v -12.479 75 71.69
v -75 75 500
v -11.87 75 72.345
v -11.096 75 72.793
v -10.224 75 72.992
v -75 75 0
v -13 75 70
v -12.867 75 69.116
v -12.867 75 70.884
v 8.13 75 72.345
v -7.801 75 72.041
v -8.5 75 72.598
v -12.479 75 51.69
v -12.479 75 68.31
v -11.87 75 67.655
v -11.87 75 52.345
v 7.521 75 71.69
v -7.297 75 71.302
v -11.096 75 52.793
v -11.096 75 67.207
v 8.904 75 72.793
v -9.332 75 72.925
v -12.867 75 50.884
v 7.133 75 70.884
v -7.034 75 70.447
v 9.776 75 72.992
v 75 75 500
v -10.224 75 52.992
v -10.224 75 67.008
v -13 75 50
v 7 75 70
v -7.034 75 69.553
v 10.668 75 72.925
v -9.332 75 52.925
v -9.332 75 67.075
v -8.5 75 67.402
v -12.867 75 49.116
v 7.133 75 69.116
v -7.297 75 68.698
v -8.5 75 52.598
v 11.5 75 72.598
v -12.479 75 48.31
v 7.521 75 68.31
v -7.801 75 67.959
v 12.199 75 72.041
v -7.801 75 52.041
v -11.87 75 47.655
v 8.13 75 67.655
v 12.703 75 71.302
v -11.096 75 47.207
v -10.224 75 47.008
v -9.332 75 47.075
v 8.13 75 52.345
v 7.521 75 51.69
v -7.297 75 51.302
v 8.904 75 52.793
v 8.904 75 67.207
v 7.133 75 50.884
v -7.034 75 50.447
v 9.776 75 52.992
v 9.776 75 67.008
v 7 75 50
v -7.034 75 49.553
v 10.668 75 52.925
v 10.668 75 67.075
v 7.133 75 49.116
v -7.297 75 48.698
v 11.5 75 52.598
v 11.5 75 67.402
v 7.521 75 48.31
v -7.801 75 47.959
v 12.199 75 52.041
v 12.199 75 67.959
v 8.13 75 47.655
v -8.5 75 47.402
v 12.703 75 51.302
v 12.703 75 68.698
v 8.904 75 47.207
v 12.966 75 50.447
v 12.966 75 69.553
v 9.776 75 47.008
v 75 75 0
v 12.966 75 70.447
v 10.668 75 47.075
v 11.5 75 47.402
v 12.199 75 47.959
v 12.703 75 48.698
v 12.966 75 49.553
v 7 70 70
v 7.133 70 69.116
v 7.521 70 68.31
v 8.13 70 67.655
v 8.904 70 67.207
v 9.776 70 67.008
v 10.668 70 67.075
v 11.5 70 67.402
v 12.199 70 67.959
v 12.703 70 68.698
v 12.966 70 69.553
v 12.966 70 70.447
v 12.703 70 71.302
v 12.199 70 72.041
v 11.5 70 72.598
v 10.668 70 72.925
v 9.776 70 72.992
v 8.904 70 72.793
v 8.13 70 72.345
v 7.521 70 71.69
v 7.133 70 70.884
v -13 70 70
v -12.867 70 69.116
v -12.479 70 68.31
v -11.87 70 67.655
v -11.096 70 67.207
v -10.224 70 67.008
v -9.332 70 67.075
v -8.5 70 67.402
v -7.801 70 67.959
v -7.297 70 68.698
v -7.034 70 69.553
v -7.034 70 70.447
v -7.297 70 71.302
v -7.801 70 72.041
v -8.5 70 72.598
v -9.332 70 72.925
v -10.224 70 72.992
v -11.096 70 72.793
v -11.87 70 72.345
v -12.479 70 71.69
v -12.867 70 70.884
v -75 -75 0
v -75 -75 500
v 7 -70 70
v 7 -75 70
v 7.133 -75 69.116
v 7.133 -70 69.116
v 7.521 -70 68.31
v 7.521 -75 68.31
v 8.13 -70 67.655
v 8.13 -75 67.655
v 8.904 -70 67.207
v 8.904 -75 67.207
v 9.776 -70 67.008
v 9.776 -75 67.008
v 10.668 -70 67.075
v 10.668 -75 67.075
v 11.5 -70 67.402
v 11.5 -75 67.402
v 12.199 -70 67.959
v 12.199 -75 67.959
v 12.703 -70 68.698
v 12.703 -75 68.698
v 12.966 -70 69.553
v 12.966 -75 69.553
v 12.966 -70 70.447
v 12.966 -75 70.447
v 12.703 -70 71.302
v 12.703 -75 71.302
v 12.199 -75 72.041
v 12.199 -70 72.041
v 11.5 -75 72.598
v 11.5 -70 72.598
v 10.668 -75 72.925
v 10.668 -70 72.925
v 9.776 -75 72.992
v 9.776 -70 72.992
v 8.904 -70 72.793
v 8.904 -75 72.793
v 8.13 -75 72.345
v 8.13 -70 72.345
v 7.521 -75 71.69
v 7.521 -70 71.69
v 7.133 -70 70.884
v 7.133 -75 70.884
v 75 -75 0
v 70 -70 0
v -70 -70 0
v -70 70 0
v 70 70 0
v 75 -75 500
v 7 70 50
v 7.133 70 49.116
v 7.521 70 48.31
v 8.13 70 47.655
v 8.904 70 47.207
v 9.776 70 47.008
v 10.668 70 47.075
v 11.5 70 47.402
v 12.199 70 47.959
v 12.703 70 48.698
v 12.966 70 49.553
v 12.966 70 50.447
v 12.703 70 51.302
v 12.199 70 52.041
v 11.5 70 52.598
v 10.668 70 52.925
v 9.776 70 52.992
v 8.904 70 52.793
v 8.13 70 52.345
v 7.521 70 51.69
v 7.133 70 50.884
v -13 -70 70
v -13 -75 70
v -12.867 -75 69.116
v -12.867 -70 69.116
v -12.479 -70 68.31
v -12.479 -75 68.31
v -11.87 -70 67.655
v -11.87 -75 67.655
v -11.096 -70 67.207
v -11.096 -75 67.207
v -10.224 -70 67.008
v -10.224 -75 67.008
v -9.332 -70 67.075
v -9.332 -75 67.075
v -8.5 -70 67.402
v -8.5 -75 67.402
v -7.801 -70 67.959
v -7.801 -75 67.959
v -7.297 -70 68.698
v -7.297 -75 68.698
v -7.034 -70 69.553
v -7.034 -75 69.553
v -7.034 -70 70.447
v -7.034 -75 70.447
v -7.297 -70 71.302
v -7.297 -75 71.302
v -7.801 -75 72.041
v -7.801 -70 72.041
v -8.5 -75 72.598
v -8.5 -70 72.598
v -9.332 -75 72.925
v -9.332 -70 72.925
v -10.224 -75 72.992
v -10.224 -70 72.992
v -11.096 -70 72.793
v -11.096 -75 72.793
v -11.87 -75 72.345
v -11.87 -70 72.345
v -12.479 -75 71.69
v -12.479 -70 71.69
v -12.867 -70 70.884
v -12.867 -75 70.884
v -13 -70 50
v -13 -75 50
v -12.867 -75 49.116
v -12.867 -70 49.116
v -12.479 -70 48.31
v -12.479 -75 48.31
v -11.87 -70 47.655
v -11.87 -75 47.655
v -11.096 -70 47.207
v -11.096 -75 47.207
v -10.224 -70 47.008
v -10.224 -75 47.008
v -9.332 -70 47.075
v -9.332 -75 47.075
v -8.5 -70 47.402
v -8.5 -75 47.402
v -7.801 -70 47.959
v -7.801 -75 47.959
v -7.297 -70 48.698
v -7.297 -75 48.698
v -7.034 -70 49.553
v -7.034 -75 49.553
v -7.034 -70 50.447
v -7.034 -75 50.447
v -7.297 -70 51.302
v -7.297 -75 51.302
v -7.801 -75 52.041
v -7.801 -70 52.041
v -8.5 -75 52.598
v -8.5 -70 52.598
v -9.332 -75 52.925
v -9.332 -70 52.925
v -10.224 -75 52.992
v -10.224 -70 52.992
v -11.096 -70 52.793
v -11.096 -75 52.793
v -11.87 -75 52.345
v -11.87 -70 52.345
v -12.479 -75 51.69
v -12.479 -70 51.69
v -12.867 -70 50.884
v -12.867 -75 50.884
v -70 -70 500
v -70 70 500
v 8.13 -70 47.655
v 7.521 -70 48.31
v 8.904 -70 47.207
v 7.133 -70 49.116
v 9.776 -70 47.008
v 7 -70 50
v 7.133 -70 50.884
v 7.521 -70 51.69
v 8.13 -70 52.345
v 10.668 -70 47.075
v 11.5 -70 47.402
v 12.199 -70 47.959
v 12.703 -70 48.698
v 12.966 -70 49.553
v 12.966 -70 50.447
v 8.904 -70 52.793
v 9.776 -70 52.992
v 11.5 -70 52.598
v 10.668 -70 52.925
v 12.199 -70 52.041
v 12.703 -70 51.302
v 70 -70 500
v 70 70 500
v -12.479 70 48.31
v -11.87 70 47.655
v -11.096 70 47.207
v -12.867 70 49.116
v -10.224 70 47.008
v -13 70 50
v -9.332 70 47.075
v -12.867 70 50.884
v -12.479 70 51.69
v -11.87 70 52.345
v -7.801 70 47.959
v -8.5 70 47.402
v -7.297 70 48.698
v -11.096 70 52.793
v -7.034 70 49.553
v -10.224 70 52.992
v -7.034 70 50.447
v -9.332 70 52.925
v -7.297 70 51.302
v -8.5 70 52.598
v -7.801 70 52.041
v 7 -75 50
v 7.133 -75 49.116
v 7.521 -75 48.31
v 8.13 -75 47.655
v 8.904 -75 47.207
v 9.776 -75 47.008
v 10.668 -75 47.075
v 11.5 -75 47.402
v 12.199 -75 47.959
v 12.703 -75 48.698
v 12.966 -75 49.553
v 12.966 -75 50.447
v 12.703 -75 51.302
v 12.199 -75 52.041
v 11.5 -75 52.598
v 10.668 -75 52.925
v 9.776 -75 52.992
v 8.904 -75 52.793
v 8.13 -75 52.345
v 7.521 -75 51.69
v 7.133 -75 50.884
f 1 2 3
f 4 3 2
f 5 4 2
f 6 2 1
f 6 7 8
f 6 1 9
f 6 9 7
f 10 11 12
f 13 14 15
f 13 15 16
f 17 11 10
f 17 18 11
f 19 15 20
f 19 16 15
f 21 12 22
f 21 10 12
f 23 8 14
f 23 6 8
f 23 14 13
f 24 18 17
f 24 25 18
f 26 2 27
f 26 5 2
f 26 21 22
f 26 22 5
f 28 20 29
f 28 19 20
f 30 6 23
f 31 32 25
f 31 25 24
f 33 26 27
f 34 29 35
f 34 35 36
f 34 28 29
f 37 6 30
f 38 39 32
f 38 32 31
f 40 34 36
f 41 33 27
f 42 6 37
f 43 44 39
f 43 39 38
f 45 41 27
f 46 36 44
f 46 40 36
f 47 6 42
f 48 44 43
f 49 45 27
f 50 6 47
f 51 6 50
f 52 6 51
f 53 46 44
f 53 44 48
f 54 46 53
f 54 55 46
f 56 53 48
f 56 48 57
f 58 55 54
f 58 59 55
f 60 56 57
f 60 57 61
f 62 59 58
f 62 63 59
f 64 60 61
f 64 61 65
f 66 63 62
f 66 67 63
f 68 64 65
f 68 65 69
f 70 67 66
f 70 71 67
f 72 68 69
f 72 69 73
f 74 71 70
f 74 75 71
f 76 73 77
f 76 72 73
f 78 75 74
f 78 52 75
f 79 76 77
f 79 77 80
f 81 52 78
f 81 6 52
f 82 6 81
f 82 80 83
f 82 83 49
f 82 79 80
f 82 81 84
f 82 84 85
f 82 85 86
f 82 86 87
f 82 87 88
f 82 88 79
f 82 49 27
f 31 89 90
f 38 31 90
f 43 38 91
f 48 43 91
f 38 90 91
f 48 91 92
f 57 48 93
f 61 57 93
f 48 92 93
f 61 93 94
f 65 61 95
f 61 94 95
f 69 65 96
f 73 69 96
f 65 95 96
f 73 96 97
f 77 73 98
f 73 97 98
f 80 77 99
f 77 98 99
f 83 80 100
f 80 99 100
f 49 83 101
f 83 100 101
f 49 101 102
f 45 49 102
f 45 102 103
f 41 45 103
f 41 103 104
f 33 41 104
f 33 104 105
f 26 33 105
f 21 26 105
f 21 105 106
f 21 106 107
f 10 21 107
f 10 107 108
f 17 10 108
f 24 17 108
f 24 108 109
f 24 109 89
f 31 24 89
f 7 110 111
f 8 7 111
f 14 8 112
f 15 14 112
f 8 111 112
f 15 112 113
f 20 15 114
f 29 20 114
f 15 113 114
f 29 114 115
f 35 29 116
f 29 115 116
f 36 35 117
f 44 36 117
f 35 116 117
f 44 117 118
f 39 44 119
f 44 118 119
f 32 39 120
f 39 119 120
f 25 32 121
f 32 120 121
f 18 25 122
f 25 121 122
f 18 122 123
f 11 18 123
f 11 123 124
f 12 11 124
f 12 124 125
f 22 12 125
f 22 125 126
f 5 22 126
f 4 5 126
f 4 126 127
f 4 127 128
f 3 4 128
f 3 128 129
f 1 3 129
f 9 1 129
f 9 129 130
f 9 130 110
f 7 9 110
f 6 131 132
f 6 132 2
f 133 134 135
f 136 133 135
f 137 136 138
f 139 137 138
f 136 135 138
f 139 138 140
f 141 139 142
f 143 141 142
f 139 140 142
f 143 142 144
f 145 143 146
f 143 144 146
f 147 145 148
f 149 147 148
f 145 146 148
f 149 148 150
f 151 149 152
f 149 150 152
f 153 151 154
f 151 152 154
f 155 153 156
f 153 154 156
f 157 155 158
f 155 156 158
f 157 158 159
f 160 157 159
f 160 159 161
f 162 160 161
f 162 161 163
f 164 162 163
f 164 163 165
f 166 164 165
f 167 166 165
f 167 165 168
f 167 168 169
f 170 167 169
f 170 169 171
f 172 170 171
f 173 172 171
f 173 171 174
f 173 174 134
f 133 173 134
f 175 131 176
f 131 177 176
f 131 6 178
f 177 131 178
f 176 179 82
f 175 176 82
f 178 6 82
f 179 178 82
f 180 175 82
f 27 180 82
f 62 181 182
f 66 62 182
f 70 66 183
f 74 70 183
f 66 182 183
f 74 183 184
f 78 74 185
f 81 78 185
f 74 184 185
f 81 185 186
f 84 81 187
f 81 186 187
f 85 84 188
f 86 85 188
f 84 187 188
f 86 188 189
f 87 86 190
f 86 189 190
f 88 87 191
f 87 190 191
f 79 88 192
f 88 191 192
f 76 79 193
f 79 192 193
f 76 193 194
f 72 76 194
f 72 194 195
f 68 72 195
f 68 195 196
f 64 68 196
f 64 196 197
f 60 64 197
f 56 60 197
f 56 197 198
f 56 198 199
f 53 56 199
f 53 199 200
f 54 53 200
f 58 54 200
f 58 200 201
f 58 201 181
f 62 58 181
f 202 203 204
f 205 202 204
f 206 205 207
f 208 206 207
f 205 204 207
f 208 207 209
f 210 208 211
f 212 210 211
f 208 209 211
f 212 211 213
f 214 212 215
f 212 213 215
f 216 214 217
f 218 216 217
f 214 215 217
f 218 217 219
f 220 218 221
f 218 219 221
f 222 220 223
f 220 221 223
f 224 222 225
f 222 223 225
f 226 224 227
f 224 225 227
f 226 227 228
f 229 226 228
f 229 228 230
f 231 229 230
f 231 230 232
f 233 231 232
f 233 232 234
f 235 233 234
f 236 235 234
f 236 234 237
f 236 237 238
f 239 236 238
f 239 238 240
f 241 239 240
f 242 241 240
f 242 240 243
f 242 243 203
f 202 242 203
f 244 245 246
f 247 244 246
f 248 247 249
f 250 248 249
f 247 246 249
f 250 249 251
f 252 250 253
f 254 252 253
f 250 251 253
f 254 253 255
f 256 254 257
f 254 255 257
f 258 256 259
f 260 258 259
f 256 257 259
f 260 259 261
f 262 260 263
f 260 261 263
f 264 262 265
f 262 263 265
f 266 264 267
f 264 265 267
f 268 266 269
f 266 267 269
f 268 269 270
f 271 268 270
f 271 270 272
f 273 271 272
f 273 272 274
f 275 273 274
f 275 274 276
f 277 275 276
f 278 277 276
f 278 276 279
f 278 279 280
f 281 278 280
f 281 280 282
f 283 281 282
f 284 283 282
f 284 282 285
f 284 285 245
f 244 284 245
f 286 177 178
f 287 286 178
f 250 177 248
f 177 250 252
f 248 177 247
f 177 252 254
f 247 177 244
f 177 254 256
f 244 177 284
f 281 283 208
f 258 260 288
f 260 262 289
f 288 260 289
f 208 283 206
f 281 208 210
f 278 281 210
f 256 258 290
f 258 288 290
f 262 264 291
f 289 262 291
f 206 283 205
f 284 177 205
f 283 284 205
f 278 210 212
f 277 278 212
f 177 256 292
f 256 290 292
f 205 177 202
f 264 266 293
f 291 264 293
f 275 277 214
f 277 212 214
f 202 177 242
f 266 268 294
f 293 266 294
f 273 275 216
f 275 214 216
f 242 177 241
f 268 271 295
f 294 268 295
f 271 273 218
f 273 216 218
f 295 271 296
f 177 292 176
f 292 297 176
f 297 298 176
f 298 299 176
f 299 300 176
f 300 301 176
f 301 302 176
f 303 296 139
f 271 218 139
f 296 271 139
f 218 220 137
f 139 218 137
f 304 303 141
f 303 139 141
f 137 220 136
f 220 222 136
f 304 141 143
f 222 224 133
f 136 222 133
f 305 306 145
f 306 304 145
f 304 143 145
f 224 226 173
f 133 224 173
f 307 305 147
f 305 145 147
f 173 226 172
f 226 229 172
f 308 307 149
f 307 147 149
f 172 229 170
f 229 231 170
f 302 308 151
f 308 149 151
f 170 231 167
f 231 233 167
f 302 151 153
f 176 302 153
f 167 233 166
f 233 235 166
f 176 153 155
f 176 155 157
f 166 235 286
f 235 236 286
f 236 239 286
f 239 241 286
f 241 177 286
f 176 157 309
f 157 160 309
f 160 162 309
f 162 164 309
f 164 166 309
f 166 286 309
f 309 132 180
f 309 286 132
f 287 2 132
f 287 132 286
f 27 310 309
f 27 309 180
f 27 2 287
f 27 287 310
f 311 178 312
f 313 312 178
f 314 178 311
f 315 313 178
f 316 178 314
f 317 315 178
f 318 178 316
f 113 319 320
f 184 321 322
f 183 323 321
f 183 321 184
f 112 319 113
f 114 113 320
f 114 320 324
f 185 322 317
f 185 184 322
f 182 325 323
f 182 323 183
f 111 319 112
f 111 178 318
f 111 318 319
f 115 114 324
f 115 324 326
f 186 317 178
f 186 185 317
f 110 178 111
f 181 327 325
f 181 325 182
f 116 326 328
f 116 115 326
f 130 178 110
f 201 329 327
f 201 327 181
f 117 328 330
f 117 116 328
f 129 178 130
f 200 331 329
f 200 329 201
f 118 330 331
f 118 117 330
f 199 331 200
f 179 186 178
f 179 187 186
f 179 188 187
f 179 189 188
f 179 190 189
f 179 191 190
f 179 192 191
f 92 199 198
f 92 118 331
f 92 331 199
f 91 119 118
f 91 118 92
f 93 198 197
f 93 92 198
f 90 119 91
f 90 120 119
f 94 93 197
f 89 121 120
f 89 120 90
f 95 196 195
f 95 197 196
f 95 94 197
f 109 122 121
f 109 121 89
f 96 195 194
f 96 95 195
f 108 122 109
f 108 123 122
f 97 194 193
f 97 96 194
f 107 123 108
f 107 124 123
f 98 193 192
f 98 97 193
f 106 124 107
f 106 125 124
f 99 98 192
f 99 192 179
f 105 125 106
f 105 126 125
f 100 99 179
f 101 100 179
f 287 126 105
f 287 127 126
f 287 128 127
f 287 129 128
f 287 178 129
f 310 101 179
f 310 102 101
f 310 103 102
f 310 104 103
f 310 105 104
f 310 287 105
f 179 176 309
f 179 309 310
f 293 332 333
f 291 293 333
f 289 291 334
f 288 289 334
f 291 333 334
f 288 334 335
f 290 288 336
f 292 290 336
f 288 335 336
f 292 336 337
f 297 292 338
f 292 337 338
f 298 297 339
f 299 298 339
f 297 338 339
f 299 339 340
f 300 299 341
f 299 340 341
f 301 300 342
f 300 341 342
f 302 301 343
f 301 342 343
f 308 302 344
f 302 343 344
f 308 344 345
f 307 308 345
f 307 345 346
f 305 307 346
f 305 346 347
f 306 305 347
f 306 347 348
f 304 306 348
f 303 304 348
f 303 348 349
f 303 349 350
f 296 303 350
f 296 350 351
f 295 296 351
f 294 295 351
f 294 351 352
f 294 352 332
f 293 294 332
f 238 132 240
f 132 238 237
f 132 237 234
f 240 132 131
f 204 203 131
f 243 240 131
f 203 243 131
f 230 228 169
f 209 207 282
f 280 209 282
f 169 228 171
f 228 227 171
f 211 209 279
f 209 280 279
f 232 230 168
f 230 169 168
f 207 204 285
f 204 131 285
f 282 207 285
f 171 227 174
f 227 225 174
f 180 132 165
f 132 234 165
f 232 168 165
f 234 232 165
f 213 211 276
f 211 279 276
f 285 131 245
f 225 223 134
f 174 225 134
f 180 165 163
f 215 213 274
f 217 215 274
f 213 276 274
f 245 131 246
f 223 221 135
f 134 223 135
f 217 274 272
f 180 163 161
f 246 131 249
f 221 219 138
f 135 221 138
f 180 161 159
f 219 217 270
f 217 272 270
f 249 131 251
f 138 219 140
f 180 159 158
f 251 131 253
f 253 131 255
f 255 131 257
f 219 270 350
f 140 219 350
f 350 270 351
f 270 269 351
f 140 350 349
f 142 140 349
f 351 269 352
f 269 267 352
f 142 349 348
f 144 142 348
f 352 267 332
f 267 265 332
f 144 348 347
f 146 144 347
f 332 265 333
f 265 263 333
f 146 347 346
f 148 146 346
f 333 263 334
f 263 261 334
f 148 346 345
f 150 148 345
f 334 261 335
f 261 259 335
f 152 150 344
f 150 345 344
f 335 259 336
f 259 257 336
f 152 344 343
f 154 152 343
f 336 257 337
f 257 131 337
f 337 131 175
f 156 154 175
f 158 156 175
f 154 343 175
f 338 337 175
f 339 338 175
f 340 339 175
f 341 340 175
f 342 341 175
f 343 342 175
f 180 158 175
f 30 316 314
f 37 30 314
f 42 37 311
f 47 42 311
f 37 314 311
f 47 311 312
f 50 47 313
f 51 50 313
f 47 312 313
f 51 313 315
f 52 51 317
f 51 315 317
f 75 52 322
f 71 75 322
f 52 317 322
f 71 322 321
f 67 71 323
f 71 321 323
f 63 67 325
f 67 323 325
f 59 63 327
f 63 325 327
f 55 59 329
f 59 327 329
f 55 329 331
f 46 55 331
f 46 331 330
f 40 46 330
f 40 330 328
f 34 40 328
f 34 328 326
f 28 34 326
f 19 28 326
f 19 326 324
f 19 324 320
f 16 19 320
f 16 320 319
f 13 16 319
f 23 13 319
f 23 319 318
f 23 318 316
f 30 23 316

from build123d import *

# Parameters (mm, degrees)
SKETCH_1_W          = 150
SKETCH_1_H          = 150
EXTRUDE_1_DEPTH     = 500
SKETCH_2_W          = 140
SKETCH_2_H          = 140
CUT_EXTRUDE_1_DEPTH = 501
MM_1_D              = 6


with BuildPart() as part:
    # 草图1 → 凸台-拉伸1 (new body)
    with BuildSketch(Plane.XY):
        Rectangle(SKETCH_1_W, SKETCH_1_H)
    extrude(amount=EXTRUDE_1_DEPTH)

    # 草图2 → 切除-拉伸1 (cut, through all)
    with BuildSketch(Plane.XY.offset(500)):
        Rectangle(SKETCH_2_W, SKETCH_2_H)
    extrude(amount=-CUT_EXTRUDE_1_DEPTH, mode=Mode.SUBTRACT)

    # 大小mm 暗销孔1 (through all)
    with Locations(Plane(origin=(0, 75, 0), x_dir=(1, 0, 0), z_dir=(0, 1, 0))):
        with Locations((-10, -50), (10, -50), (10, -70), (-10, -70)):
            Hole(MM_1_D / 2)


solid = part.part
